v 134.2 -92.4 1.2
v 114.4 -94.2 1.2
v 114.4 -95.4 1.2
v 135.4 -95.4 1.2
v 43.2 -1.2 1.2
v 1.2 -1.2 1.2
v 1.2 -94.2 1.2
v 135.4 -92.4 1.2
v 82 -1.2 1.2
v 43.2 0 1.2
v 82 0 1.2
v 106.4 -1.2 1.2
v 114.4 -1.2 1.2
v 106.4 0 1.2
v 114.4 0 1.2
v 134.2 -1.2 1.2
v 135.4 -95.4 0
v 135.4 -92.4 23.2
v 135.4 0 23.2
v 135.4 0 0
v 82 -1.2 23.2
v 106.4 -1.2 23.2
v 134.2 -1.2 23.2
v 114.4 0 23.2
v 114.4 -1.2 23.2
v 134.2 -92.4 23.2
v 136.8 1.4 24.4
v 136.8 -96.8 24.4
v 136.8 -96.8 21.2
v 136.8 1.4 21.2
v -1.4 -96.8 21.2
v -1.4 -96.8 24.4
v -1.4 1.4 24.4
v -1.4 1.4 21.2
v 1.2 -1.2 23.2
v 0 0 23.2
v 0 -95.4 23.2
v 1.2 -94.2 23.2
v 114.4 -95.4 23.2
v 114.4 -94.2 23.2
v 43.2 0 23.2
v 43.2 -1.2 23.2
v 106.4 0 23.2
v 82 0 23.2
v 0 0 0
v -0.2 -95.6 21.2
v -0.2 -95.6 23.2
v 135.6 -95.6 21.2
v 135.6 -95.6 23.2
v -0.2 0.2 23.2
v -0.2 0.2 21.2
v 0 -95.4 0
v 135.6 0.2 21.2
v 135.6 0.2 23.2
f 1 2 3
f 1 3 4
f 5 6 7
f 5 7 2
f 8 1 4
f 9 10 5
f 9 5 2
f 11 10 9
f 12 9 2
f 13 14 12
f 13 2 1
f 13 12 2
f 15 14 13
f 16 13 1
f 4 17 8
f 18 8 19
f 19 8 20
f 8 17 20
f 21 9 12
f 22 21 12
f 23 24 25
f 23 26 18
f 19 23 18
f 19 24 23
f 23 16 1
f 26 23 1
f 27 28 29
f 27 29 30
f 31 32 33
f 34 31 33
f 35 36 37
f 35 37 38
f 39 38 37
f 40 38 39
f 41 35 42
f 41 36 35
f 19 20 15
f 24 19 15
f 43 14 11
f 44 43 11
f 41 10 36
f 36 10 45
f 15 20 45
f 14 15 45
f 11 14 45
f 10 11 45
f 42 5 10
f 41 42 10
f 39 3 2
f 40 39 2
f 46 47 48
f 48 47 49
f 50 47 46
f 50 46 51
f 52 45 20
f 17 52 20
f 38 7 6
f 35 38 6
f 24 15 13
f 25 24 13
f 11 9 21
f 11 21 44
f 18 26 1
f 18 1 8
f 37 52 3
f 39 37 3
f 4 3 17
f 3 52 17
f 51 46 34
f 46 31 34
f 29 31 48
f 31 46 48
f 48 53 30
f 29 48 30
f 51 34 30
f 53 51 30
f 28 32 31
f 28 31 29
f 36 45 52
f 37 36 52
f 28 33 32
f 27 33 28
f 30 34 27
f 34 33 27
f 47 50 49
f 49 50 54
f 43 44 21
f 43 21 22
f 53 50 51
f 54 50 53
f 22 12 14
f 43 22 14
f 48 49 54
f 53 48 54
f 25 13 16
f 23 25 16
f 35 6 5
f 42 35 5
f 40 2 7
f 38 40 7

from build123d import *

# Parameters (mm, degrees)
F0_W     = 135.4
F0_H     = 95.4
F1_DEPTH = 1.2
F2_W     = 24.4
F2_H     = 1.2
F3_DEPTH = 22
F4_W     = 138.2
F4_H     = 98.2
F5_DEPTH = 1.2
F6_W     = 138.2
F6_H     = 98.2
F6_W_2   = 135.8
F6_H_2   = 95.8
F7_DEPTH = 2


with BuildPart() as f1:
    # F0 (on Top) → F1 (new body)
    with BuildSketch(Plane.XY):
        with Locations((67.7, -47.7)):
            Rectangle(F0_W, F0_H)
    extrude(amount=F1_DEPTH)

    # F2 (on face) → F3 (join)
    with BuildSketch(Plane.XY.offset(1.2)):
        Polygon((0, -95.4), (114.4, -95.4), (114.4, -94.2), (1.2, -94.2), (1.2, -1.2), (43.2, -1.2), (43.2, 0), (0, 0), align=None)
        with Locations((94.2, -0.6)):
            Rectangle(F2_W, F2_H)
        Polygon((135.4, 0), (114.4, 0), (114.4, -1.2), (134.2, -1.2), (134.2, -92.4), (135.4, -92.4), align=None)
    extrude(amount=F3_DEPTH)


with BuildPart() as f5:
    # F4 (on face) → F5 (new body)
    with BuildSketch(Plane.XY.offset(23.2)):
        with Locations((67.7, -47.7)):
            Rectangle(F4_W, F4_H)
    extrude(amount=F5_DEPTH)

    # F6 (on face) → F7 (join)
    with BuildSketch(Plane.XY.offset(23.2)):
        with Locations((67.7, -47.7)):
            Rectangle(F6_W, F6_H)
        with Locations((67.7, -47.7)):
            Rectangle(F6_W_2, F6_H_2, mode=Mode.SUBTRACT)
    extrude(amount=-F7_DEPTH)


solid = Compound([f1.part, f5.part])
